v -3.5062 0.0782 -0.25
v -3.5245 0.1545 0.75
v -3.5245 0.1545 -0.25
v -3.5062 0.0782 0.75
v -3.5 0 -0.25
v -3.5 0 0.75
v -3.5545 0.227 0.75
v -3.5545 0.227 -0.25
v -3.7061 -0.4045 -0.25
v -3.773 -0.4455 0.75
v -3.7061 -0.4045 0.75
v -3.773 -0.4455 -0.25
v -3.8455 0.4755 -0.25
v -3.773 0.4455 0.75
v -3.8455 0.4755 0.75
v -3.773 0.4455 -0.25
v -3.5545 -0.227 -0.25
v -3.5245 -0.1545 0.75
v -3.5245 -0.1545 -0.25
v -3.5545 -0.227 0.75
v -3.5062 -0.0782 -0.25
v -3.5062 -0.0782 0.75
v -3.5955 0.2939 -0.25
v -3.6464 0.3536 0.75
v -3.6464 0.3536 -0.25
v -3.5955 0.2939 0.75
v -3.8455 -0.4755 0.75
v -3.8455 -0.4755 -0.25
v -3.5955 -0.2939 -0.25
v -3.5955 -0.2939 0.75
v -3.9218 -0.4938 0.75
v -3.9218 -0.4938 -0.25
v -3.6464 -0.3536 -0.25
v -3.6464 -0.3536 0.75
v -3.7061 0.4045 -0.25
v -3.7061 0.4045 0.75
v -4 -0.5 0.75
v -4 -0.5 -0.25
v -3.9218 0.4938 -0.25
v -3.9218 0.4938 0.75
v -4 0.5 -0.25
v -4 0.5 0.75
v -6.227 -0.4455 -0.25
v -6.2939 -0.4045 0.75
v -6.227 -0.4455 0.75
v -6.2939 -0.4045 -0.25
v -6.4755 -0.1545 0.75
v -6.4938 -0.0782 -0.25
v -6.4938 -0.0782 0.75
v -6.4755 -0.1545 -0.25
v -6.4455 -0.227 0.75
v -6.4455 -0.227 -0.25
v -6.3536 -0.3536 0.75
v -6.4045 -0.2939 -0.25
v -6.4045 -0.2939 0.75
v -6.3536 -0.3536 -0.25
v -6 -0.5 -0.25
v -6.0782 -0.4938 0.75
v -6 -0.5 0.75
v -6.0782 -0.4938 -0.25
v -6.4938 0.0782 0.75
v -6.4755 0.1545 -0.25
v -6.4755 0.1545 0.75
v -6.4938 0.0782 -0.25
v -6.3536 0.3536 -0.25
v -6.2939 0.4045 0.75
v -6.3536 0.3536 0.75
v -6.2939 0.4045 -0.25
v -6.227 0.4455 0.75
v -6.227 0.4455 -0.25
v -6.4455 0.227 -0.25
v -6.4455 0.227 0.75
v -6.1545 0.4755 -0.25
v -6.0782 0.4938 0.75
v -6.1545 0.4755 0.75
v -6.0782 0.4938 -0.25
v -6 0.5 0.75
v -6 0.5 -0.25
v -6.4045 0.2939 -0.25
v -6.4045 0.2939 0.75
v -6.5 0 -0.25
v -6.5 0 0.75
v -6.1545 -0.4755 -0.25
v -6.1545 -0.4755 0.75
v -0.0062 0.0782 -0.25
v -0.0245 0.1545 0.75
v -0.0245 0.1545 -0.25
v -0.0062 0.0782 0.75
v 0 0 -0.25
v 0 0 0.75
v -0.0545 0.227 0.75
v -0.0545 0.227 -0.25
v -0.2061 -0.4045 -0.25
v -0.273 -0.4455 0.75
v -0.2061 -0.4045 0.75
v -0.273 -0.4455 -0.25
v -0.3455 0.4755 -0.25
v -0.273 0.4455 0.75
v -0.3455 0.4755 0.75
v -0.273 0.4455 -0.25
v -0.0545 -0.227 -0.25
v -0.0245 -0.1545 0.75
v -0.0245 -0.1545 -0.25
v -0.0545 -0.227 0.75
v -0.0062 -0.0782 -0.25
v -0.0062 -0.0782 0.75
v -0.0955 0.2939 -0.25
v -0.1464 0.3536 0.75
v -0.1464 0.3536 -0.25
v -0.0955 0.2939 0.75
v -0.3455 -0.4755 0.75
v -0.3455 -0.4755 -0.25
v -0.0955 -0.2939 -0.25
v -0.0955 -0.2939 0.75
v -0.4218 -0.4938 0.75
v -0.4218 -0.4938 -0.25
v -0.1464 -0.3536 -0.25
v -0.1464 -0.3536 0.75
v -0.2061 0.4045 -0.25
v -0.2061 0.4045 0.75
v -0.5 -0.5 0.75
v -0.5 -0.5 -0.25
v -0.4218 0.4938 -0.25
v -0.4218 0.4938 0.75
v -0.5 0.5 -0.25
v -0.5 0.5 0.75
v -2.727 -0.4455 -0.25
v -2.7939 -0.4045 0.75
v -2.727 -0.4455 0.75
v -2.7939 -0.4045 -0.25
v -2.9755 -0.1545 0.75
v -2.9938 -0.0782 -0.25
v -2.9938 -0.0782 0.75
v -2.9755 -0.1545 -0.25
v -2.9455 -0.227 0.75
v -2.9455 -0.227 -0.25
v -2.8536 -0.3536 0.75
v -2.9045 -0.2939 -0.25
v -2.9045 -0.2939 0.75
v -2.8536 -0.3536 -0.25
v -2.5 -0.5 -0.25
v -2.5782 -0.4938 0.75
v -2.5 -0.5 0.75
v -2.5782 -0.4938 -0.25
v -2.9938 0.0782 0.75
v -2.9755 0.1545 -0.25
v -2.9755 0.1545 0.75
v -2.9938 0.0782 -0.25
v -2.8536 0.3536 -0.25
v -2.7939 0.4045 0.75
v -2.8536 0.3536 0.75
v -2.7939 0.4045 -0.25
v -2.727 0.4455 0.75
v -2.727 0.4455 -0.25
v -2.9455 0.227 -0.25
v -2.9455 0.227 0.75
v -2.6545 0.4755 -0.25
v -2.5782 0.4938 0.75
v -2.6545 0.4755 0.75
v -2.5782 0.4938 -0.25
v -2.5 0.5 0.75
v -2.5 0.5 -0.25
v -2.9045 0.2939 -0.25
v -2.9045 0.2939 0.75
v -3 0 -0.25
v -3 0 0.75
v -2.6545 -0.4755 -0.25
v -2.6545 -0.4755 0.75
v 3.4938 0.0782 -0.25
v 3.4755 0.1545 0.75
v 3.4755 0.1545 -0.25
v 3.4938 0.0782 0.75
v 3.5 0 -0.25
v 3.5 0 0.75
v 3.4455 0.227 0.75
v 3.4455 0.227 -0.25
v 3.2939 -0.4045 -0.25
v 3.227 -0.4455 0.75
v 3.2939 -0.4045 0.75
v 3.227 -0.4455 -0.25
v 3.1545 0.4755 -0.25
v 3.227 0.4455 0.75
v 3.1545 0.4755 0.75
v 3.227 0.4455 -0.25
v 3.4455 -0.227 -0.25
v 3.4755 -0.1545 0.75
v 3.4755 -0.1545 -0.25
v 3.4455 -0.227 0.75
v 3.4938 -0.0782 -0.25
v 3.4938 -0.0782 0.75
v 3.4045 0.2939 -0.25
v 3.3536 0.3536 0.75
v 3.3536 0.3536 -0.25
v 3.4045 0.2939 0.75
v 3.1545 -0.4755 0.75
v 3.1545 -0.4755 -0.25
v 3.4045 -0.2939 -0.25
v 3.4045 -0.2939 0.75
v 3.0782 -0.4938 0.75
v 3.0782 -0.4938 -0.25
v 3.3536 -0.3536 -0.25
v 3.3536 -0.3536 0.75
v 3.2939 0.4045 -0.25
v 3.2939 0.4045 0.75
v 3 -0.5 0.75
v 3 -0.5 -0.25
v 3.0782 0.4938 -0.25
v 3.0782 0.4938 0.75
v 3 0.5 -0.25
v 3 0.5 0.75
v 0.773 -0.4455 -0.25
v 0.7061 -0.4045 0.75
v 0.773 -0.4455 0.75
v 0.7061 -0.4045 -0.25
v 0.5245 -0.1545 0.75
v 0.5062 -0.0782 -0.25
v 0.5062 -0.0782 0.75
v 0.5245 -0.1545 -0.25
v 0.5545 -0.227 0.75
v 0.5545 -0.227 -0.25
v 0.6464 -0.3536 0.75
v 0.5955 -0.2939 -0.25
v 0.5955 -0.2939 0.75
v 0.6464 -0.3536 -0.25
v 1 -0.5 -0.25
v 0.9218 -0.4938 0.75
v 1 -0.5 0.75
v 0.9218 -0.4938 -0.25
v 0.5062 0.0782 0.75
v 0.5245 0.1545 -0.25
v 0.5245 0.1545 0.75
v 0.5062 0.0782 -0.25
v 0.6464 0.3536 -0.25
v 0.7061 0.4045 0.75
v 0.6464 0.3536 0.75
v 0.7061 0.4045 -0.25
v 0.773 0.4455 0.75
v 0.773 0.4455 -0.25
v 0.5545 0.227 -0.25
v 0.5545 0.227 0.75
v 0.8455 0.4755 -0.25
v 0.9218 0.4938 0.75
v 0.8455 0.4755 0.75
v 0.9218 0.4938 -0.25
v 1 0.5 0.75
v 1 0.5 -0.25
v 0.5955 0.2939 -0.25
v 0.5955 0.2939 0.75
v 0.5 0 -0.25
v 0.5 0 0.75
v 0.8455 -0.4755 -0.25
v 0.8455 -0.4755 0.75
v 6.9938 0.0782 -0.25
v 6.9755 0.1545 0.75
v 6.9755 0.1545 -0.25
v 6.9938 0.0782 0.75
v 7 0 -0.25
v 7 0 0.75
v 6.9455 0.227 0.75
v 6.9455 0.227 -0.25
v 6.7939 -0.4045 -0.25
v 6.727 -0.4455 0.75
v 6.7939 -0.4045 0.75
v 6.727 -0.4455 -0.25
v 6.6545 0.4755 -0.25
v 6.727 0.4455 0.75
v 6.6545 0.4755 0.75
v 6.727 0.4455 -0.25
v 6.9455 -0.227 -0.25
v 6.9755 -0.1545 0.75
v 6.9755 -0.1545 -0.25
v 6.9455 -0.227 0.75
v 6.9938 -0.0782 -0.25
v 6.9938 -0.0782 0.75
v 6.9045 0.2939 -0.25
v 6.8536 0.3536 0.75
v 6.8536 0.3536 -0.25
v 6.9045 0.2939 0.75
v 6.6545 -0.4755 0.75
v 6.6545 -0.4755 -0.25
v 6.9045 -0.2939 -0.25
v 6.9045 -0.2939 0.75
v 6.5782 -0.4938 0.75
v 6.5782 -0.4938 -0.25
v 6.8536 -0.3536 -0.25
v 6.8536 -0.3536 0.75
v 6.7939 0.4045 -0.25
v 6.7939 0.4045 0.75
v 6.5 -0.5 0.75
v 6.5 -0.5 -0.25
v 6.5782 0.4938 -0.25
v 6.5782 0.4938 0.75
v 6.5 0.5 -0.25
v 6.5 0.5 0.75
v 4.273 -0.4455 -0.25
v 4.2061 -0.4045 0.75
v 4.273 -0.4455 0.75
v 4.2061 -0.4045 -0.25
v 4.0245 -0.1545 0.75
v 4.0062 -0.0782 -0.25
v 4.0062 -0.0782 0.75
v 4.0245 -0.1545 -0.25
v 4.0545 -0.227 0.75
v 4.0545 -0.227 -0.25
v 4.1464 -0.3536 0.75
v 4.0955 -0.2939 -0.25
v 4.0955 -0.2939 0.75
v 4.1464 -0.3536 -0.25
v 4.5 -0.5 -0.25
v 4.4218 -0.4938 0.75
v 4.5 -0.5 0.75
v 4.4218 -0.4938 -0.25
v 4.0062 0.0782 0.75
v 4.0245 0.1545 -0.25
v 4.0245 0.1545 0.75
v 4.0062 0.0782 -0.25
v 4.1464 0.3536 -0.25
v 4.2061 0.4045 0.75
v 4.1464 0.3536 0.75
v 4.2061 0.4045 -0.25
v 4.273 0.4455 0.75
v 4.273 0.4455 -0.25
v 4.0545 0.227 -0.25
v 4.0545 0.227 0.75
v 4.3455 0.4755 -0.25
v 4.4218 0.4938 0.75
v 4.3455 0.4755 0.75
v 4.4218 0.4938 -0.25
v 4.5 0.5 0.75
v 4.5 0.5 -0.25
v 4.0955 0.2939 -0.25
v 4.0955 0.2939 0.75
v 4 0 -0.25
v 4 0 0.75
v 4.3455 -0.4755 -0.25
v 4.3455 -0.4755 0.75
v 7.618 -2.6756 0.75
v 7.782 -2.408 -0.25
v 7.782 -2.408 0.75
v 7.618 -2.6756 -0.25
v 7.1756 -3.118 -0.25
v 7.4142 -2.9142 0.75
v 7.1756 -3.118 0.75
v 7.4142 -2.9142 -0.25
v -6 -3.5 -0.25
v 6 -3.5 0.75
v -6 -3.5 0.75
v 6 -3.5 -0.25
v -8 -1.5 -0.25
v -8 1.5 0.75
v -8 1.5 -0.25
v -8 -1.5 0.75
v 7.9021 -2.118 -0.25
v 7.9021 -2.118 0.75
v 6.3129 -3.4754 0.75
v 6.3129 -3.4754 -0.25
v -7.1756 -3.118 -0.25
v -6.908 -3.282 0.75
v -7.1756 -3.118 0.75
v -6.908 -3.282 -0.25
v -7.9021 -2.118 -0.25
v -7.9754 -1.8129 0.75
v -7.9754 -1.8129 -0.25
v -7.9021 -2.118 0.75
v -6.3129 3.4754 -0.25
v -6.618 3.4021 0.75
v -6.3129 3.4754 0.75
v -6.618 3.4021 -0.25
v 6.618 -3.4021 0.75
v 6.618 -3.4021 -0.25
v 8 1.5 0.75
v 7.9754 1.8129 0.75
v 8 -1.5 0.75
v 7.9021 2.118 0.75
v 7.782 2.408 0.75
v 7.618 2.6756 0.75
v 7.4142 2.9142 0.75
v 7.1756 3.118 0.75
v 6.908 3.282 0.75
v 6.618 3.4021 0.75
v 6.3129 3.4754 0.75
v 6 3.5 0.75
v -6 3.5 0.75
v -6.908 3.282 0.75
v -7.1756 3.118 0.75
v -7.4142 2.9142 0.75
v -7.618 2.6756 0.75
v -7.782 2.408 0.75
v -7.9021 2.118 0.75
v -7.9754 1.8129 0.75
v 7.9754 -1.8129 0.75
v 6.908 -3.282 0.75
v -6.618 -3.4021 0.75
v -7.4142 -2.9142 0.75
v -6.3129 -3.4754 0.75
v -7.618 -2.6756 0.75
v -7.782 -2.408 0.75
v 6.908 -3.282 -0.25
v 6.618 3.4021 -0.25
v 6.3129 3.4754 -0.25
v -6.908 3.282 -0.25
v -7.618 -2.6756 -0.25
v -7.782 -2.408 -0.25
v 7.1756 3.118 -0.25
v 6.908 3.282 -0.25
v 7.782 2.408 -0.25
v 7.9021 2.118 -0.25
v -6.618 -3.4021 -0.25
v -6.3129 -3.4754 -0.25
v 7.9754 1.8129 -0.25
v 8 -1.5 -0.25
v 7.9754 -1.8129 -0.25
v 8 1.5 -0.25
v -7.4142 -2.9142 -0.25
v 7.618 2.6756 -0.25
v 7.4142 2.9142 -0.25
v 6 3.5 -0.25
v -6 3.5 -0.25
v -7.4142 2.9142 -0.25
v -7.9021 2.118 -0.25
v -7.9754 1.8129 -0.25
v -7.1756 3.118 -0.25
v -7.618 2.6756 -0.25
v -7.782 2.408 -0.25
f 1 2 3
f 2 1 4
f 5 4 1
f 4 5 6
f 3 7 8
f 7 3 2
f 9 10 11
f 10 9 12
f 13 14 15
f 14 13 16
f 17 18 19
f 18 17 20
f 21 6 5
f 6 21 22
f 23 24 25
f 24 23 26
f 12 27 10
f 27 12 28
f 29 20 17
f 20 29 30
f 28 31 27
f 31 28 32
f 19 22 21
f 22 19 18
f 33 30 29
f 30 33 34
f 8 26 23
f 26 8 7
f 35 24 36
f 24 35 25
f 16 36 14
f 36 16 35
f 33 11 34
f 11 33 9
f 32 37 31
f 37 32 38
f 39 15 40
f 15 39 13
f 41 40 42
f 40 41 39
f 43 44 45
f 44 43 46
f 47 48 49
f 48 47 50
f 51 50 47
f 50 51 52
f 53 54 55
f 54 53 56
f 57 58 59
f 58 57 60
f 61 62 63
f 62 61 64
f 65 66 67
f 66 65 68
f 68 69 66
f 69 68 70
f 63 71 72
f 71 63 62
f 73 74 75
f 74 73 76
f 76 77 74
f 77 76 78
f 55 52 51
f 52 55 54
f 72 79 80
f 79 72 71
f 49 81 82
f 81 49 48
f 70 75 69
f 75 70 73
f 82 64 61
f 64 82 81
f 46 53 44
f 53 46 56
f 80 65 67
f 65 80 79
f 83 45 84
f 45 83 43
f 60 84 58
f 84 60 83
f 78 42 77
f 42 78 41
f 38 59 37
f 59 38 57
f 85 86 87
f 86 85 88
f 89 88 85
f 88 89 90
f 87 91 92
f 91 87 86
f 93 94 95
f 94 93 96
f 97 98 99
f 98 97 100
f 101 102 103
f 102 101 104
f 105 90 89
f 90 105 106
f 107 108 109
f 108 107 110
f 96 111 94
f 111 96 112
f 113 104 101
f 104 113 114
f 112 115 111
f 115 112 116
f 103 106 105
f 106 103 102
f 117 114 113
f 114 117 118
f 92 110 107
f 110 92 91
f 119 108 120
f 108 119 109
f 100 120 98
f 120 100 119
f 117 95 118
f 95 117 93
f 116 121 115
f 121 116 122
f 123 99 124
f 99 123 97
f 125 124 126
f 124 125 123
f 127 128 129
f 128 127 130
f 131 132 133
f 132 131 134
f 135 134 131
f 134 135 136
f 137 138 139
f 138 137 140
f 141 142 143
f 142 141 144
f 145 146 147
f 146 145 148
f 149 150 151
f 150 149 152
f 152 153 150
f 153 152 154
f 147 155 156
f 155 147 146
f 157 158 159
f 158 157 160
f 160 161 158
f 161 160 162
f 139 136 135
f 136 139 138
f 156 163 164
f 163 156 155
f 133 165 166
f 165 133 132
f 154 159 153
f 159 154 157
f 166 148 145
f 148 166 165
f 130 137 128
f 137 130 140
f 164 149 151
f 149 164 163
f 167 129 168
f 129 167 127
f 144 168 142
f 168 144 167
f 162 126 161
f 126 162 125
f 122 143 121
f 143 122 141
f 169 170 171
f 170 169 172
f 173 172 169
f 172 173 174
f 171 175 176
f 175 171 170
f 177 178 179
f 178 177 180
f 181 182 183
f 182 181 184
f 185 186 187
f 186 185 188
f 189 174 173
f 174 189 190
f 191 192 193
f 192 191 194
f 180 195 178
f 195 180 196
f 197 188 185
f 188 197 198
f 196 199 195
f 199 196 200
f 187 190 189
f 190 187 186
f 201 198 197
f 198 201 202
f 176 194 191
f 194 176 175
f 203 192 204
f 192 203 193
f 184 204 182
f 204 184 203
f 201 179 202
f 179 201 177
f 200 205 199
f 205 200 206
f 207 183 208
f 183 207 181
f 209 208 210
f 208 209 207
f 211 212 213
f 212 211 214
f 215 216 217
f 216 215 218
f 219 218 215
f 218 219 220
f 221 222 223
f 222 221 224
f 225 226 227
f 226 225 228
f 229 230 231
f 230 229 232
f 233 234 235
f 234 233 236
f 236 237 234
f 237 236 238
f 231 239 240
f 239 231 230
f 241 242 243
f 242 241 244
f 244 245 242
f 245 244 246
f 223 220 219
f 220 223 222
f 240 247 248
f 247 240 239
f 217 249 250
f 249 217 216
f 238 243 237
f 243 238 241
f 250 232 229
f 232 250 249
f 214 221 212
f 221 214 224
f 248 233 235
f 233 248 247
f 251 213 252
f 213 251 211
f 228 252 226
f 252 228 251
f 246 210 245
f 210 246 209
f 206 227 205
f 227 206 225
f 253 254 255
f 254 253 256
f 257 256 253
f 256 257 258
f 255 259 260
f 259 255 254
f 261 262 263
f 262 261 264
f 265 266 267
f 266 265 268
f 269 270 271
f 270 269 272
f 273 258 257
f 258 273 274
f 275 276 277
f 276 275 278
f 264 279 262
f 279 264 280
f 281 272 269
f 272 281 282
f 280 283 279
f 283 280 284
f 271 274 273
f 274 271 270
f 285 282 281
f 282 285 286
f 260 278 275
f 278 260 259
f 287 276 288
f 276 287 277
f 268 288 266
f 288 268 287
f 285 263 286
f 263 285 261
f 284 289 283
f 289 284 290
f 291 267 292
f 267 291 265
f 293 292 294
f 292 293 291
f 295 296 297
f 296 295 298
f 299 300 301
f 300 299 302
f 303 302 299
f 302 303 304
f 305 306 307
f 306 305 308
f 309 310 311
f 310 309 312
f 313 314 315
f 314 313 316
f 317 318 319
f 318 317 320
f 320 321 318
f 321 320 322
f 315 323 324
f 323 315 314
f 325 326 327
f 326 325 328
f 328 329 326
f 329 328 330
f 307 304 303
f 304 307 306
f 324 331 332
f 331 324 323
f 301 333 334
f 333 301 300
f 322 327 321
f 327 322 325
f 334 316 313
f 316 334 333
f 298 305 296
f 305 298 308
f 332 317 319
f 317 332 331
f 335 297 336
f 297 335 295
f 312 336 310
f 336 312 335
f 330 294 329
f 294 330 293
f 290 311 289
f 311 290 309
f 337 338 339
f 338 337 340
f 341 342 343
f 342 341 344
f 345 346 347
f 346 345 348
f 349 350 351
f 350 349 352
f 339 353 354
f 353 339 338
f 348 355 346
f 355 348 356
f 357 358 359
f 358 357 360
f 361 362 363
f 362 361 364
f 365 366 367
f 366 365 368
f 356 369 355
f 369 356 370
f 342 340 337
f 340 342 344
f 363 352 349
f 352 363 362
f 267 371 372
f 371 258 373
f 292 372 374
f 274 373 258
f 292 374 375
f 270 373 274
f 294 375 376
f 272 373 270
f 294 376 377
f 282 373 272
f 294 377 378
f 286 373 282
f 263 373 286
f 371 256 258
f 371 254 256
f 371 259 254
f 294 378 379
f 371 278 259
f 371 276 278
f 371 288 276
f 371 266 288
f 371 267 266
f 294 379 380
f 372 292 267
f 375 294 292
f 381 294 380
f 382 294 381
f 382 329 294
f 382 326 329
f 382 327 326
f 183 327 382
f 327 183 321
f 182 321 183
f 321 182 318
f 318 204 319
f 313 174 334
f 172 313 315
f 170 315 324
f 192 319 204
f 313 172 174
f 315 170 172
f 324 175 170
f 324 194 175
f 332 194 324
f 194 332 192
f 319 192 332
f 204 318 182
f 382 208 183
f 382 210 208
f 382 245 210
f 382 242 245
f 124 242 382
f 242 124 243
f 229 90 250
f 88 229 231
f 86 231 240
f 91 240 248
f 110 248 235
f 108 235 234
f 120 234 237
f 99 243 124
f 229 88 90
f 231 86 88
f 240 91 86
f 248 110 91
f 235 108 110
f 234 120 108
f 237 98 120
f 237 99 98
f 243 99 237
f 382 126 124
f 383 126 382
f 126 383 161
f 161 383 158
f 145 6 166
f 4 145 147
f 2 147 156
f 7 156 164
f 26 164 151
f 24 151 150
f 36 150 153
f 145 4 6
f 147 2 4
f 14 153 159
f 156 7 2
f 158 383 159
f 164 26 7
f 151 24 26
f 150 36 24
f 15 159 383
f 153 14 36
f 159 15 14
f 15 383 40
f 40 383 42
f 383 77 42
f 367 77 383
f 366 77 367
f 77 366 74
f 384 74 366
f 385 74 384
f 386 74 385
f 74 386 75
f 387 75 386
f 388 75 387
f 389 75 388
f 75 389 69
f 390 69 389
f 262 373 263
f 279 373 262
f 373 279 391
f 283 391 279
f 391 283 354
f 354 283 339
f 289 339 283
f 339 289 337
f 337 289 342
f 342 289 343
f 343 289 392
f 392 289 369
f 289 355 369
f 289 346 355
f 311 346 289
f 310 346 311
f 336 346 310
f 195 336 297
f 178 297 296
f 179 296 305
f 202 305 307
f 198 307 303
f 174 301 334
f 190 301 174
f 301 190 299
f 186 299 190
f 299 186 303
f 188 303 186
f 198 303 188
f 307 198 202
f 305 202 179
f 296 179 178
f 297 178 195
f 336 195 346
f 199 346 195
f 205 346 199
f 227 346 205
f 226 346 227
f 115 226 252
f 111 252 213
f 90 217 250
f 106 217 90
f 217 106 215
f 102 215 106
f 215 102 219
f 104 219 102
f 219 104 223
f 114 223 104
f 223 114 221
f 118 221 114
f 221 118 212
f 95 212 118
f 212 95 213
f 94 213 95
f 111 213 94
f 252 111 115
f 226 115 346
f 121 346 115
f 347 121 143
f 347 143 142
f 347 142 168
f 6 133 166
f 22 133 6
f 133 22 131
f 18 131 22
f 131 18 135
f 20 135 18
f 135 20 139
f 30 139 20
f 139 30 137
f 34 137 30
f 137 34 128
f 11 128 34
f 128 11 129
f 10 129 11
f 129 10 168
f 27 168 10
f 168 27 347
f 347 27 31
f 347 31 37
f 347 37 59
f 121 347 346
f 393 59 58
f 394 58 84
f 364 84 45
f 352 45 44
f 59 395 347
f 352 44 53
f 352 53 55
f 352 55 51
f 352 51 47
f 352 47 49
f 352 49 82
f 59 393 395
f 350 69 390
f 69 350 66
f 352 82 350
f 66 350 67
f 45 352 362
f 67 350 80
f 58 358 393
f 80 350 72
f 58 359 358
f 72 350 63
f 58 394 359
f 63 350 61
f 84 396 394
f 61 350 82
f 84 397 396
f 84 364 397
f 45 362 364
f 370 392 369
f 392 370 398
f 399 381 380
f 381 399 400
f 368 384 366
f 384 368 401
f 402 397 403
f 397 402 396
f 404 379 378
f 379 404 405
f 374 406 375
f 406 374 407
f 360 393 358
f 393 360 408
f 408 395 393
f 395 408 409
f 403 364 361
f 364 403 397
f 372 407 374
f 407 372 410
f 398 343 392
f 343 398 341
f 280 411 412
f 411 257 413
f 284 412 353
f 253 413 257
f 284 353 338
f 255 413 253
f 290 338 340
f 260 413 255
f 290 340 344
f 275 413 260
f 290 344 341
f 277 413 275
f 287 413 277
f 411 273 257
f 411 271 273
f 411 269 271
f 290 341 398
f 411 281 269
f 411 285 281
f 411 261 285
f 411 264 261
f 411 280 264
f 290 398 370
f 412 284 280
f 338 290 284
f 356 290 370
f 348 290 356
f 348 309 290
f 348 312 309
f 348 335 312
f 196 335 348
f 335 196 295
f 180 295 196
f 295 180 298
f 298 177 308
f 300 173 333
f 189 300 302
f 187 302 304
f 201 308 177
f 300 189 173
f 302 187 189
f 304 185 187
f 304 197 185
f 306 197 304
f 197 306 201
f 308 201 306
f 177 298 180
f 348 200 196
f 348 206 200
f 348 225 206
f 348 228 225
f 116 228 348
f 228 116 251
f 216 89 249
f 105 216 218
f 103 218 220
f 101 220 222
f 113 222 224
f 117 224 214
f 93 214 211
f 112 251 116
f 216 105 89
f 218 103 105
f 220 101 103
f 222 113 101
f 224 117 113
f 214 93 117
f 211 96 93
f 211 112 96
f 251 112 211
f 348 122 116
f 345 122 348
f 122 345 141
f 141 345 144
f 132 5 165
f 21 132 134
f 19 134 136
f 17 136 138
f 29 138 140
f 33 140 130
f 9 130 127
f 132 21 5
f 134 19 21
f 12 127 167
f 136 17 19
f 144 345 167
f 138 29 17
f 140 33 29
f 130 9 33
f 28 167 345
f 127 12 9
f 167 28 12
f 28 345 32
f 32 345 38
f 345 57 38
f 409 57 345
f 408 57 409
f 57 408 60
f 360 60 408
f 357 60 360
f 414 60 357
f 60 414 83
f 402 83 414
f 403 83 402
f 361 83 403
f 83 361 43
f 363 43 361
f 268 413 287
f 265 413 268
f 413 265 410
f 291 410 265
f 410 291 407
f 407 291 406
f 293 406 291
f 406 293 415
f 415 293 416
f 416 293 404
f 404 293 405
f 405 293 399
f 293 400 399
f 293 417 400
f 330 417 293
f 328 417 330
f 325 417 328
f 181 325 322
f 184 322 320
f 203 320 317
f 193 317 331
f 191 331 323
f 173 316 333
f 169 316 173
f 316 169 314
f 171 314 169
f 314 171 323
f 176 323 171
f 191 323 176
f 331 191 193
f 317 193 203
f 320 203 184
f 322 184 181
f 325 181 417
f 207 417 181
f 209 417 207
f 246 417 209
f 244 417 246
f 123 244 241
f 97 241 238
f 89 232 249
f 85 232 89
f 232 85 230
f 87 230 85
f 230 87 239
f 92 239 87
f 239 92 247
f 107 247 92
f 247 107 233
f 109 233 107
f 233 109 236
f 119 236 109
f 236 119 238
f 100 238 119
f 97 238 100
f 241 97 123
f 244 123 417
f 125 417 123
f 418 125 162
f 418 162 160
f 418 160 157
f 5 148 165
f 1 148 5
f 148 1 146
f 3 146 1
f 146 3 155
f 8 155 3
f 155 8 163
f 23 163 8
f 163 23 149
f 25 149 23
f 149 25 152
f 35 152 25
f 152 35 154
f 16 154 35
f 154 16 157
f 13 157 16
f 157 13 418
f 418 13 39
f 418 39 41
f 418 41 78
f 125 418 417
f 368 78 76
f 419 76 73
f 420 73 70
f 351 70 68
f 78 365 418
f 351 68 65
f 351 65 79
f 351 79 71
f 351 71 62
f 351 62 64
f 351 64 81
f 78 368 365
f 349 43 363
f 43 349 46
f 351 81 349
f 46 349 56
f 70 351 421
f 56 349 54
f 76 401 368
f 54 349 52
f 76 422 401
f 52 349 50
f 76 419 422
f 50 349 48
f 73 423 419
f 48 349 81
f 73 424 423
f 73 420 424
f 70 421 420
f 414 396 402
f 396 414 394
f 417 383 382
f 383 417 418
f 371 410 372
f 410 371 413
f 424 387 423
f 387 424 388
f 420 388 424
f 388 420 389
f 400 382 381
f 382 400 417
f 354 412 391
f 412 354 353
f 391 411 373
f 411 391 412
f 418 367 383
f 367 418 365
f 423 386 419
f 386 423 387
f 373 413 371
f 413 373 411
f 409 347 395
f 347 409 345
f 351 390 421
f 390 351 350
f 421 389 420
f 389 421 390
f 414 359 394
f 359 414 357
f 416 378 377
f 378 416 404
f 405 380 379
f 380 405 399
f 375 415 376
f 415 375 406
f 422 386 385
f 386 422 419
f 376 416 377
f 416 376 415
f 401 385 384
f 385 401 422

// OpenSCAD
module Piece_02(){
    module Mech_Piece_01(){

    Key_Lenght = 10;
    Key_Height = 10;
    Key_Width = 15;

    color("#a8b0b2")
    union(){
        translate([1,0,0])
        cylinder(5,0.5,0.5, $fn=40, center=true);
        translate([-1,0,0])
        cylinder(5,0.5,0.5, $fn=40, center=true);
        cube([2,1,5],center = true);
    }

    }
    difference(){
        minkowski(){
            cube([12,3,0.5],center = true);
            translate([0,0,0], $fn = 40)
            cylinder(0.5,2,2);
            }
                for (i=[-5:3.5:7]) {
                    translate([i,0,0]){
                    Mech_Piece_01();
                    }

                }

    }
}

color("gray")
Piece_02();


// Written by Nicolì Angelo (Gengio) 2024: 
// MIT License

//Permission is hereby granted, free of charge, to any person obtaining a copy of this software and associated documentation files (the "Software"), to deal in the Software without restriction, including without limitation the rights to use, copy, modify, merge, publish, distribute, sublicense, and/or sell copies of the Software, and to permit persons to whom the Software is furnished to do so, subject to the following conditions:

//The above copyright notice and this permission notice shall be included in all copies or substantial portions of the Software.

//THE SOFTWARE IS PROVIDED "AS IS", WITHOUT WARRANTY OF ANY KIND, EXPRESS OR IMPLIED, INCLUDING BUT NOT LIMITED TO THE WARRANTIES OF MERCHANTABILITY, FITNESS FOR A PARTICULAR PURPOSE AND NONINFRINGEMENT. IN NO EVENT SHALL THE AUTHORS OR COPYRIGHT HOLDERS BE LIABLE FOR ANY CLAIM, DAMAGES OR OTHER LIABILITY, WHETHER IN AN ACTION OF CONTRACT, TORT OR OTHERWISE, ARISING FROM, OUT OF OR IN CONNECTION WITH THE SOFTWARE OR THE USE OR OTHER DEALINGS IN THE SOFTWARE.
